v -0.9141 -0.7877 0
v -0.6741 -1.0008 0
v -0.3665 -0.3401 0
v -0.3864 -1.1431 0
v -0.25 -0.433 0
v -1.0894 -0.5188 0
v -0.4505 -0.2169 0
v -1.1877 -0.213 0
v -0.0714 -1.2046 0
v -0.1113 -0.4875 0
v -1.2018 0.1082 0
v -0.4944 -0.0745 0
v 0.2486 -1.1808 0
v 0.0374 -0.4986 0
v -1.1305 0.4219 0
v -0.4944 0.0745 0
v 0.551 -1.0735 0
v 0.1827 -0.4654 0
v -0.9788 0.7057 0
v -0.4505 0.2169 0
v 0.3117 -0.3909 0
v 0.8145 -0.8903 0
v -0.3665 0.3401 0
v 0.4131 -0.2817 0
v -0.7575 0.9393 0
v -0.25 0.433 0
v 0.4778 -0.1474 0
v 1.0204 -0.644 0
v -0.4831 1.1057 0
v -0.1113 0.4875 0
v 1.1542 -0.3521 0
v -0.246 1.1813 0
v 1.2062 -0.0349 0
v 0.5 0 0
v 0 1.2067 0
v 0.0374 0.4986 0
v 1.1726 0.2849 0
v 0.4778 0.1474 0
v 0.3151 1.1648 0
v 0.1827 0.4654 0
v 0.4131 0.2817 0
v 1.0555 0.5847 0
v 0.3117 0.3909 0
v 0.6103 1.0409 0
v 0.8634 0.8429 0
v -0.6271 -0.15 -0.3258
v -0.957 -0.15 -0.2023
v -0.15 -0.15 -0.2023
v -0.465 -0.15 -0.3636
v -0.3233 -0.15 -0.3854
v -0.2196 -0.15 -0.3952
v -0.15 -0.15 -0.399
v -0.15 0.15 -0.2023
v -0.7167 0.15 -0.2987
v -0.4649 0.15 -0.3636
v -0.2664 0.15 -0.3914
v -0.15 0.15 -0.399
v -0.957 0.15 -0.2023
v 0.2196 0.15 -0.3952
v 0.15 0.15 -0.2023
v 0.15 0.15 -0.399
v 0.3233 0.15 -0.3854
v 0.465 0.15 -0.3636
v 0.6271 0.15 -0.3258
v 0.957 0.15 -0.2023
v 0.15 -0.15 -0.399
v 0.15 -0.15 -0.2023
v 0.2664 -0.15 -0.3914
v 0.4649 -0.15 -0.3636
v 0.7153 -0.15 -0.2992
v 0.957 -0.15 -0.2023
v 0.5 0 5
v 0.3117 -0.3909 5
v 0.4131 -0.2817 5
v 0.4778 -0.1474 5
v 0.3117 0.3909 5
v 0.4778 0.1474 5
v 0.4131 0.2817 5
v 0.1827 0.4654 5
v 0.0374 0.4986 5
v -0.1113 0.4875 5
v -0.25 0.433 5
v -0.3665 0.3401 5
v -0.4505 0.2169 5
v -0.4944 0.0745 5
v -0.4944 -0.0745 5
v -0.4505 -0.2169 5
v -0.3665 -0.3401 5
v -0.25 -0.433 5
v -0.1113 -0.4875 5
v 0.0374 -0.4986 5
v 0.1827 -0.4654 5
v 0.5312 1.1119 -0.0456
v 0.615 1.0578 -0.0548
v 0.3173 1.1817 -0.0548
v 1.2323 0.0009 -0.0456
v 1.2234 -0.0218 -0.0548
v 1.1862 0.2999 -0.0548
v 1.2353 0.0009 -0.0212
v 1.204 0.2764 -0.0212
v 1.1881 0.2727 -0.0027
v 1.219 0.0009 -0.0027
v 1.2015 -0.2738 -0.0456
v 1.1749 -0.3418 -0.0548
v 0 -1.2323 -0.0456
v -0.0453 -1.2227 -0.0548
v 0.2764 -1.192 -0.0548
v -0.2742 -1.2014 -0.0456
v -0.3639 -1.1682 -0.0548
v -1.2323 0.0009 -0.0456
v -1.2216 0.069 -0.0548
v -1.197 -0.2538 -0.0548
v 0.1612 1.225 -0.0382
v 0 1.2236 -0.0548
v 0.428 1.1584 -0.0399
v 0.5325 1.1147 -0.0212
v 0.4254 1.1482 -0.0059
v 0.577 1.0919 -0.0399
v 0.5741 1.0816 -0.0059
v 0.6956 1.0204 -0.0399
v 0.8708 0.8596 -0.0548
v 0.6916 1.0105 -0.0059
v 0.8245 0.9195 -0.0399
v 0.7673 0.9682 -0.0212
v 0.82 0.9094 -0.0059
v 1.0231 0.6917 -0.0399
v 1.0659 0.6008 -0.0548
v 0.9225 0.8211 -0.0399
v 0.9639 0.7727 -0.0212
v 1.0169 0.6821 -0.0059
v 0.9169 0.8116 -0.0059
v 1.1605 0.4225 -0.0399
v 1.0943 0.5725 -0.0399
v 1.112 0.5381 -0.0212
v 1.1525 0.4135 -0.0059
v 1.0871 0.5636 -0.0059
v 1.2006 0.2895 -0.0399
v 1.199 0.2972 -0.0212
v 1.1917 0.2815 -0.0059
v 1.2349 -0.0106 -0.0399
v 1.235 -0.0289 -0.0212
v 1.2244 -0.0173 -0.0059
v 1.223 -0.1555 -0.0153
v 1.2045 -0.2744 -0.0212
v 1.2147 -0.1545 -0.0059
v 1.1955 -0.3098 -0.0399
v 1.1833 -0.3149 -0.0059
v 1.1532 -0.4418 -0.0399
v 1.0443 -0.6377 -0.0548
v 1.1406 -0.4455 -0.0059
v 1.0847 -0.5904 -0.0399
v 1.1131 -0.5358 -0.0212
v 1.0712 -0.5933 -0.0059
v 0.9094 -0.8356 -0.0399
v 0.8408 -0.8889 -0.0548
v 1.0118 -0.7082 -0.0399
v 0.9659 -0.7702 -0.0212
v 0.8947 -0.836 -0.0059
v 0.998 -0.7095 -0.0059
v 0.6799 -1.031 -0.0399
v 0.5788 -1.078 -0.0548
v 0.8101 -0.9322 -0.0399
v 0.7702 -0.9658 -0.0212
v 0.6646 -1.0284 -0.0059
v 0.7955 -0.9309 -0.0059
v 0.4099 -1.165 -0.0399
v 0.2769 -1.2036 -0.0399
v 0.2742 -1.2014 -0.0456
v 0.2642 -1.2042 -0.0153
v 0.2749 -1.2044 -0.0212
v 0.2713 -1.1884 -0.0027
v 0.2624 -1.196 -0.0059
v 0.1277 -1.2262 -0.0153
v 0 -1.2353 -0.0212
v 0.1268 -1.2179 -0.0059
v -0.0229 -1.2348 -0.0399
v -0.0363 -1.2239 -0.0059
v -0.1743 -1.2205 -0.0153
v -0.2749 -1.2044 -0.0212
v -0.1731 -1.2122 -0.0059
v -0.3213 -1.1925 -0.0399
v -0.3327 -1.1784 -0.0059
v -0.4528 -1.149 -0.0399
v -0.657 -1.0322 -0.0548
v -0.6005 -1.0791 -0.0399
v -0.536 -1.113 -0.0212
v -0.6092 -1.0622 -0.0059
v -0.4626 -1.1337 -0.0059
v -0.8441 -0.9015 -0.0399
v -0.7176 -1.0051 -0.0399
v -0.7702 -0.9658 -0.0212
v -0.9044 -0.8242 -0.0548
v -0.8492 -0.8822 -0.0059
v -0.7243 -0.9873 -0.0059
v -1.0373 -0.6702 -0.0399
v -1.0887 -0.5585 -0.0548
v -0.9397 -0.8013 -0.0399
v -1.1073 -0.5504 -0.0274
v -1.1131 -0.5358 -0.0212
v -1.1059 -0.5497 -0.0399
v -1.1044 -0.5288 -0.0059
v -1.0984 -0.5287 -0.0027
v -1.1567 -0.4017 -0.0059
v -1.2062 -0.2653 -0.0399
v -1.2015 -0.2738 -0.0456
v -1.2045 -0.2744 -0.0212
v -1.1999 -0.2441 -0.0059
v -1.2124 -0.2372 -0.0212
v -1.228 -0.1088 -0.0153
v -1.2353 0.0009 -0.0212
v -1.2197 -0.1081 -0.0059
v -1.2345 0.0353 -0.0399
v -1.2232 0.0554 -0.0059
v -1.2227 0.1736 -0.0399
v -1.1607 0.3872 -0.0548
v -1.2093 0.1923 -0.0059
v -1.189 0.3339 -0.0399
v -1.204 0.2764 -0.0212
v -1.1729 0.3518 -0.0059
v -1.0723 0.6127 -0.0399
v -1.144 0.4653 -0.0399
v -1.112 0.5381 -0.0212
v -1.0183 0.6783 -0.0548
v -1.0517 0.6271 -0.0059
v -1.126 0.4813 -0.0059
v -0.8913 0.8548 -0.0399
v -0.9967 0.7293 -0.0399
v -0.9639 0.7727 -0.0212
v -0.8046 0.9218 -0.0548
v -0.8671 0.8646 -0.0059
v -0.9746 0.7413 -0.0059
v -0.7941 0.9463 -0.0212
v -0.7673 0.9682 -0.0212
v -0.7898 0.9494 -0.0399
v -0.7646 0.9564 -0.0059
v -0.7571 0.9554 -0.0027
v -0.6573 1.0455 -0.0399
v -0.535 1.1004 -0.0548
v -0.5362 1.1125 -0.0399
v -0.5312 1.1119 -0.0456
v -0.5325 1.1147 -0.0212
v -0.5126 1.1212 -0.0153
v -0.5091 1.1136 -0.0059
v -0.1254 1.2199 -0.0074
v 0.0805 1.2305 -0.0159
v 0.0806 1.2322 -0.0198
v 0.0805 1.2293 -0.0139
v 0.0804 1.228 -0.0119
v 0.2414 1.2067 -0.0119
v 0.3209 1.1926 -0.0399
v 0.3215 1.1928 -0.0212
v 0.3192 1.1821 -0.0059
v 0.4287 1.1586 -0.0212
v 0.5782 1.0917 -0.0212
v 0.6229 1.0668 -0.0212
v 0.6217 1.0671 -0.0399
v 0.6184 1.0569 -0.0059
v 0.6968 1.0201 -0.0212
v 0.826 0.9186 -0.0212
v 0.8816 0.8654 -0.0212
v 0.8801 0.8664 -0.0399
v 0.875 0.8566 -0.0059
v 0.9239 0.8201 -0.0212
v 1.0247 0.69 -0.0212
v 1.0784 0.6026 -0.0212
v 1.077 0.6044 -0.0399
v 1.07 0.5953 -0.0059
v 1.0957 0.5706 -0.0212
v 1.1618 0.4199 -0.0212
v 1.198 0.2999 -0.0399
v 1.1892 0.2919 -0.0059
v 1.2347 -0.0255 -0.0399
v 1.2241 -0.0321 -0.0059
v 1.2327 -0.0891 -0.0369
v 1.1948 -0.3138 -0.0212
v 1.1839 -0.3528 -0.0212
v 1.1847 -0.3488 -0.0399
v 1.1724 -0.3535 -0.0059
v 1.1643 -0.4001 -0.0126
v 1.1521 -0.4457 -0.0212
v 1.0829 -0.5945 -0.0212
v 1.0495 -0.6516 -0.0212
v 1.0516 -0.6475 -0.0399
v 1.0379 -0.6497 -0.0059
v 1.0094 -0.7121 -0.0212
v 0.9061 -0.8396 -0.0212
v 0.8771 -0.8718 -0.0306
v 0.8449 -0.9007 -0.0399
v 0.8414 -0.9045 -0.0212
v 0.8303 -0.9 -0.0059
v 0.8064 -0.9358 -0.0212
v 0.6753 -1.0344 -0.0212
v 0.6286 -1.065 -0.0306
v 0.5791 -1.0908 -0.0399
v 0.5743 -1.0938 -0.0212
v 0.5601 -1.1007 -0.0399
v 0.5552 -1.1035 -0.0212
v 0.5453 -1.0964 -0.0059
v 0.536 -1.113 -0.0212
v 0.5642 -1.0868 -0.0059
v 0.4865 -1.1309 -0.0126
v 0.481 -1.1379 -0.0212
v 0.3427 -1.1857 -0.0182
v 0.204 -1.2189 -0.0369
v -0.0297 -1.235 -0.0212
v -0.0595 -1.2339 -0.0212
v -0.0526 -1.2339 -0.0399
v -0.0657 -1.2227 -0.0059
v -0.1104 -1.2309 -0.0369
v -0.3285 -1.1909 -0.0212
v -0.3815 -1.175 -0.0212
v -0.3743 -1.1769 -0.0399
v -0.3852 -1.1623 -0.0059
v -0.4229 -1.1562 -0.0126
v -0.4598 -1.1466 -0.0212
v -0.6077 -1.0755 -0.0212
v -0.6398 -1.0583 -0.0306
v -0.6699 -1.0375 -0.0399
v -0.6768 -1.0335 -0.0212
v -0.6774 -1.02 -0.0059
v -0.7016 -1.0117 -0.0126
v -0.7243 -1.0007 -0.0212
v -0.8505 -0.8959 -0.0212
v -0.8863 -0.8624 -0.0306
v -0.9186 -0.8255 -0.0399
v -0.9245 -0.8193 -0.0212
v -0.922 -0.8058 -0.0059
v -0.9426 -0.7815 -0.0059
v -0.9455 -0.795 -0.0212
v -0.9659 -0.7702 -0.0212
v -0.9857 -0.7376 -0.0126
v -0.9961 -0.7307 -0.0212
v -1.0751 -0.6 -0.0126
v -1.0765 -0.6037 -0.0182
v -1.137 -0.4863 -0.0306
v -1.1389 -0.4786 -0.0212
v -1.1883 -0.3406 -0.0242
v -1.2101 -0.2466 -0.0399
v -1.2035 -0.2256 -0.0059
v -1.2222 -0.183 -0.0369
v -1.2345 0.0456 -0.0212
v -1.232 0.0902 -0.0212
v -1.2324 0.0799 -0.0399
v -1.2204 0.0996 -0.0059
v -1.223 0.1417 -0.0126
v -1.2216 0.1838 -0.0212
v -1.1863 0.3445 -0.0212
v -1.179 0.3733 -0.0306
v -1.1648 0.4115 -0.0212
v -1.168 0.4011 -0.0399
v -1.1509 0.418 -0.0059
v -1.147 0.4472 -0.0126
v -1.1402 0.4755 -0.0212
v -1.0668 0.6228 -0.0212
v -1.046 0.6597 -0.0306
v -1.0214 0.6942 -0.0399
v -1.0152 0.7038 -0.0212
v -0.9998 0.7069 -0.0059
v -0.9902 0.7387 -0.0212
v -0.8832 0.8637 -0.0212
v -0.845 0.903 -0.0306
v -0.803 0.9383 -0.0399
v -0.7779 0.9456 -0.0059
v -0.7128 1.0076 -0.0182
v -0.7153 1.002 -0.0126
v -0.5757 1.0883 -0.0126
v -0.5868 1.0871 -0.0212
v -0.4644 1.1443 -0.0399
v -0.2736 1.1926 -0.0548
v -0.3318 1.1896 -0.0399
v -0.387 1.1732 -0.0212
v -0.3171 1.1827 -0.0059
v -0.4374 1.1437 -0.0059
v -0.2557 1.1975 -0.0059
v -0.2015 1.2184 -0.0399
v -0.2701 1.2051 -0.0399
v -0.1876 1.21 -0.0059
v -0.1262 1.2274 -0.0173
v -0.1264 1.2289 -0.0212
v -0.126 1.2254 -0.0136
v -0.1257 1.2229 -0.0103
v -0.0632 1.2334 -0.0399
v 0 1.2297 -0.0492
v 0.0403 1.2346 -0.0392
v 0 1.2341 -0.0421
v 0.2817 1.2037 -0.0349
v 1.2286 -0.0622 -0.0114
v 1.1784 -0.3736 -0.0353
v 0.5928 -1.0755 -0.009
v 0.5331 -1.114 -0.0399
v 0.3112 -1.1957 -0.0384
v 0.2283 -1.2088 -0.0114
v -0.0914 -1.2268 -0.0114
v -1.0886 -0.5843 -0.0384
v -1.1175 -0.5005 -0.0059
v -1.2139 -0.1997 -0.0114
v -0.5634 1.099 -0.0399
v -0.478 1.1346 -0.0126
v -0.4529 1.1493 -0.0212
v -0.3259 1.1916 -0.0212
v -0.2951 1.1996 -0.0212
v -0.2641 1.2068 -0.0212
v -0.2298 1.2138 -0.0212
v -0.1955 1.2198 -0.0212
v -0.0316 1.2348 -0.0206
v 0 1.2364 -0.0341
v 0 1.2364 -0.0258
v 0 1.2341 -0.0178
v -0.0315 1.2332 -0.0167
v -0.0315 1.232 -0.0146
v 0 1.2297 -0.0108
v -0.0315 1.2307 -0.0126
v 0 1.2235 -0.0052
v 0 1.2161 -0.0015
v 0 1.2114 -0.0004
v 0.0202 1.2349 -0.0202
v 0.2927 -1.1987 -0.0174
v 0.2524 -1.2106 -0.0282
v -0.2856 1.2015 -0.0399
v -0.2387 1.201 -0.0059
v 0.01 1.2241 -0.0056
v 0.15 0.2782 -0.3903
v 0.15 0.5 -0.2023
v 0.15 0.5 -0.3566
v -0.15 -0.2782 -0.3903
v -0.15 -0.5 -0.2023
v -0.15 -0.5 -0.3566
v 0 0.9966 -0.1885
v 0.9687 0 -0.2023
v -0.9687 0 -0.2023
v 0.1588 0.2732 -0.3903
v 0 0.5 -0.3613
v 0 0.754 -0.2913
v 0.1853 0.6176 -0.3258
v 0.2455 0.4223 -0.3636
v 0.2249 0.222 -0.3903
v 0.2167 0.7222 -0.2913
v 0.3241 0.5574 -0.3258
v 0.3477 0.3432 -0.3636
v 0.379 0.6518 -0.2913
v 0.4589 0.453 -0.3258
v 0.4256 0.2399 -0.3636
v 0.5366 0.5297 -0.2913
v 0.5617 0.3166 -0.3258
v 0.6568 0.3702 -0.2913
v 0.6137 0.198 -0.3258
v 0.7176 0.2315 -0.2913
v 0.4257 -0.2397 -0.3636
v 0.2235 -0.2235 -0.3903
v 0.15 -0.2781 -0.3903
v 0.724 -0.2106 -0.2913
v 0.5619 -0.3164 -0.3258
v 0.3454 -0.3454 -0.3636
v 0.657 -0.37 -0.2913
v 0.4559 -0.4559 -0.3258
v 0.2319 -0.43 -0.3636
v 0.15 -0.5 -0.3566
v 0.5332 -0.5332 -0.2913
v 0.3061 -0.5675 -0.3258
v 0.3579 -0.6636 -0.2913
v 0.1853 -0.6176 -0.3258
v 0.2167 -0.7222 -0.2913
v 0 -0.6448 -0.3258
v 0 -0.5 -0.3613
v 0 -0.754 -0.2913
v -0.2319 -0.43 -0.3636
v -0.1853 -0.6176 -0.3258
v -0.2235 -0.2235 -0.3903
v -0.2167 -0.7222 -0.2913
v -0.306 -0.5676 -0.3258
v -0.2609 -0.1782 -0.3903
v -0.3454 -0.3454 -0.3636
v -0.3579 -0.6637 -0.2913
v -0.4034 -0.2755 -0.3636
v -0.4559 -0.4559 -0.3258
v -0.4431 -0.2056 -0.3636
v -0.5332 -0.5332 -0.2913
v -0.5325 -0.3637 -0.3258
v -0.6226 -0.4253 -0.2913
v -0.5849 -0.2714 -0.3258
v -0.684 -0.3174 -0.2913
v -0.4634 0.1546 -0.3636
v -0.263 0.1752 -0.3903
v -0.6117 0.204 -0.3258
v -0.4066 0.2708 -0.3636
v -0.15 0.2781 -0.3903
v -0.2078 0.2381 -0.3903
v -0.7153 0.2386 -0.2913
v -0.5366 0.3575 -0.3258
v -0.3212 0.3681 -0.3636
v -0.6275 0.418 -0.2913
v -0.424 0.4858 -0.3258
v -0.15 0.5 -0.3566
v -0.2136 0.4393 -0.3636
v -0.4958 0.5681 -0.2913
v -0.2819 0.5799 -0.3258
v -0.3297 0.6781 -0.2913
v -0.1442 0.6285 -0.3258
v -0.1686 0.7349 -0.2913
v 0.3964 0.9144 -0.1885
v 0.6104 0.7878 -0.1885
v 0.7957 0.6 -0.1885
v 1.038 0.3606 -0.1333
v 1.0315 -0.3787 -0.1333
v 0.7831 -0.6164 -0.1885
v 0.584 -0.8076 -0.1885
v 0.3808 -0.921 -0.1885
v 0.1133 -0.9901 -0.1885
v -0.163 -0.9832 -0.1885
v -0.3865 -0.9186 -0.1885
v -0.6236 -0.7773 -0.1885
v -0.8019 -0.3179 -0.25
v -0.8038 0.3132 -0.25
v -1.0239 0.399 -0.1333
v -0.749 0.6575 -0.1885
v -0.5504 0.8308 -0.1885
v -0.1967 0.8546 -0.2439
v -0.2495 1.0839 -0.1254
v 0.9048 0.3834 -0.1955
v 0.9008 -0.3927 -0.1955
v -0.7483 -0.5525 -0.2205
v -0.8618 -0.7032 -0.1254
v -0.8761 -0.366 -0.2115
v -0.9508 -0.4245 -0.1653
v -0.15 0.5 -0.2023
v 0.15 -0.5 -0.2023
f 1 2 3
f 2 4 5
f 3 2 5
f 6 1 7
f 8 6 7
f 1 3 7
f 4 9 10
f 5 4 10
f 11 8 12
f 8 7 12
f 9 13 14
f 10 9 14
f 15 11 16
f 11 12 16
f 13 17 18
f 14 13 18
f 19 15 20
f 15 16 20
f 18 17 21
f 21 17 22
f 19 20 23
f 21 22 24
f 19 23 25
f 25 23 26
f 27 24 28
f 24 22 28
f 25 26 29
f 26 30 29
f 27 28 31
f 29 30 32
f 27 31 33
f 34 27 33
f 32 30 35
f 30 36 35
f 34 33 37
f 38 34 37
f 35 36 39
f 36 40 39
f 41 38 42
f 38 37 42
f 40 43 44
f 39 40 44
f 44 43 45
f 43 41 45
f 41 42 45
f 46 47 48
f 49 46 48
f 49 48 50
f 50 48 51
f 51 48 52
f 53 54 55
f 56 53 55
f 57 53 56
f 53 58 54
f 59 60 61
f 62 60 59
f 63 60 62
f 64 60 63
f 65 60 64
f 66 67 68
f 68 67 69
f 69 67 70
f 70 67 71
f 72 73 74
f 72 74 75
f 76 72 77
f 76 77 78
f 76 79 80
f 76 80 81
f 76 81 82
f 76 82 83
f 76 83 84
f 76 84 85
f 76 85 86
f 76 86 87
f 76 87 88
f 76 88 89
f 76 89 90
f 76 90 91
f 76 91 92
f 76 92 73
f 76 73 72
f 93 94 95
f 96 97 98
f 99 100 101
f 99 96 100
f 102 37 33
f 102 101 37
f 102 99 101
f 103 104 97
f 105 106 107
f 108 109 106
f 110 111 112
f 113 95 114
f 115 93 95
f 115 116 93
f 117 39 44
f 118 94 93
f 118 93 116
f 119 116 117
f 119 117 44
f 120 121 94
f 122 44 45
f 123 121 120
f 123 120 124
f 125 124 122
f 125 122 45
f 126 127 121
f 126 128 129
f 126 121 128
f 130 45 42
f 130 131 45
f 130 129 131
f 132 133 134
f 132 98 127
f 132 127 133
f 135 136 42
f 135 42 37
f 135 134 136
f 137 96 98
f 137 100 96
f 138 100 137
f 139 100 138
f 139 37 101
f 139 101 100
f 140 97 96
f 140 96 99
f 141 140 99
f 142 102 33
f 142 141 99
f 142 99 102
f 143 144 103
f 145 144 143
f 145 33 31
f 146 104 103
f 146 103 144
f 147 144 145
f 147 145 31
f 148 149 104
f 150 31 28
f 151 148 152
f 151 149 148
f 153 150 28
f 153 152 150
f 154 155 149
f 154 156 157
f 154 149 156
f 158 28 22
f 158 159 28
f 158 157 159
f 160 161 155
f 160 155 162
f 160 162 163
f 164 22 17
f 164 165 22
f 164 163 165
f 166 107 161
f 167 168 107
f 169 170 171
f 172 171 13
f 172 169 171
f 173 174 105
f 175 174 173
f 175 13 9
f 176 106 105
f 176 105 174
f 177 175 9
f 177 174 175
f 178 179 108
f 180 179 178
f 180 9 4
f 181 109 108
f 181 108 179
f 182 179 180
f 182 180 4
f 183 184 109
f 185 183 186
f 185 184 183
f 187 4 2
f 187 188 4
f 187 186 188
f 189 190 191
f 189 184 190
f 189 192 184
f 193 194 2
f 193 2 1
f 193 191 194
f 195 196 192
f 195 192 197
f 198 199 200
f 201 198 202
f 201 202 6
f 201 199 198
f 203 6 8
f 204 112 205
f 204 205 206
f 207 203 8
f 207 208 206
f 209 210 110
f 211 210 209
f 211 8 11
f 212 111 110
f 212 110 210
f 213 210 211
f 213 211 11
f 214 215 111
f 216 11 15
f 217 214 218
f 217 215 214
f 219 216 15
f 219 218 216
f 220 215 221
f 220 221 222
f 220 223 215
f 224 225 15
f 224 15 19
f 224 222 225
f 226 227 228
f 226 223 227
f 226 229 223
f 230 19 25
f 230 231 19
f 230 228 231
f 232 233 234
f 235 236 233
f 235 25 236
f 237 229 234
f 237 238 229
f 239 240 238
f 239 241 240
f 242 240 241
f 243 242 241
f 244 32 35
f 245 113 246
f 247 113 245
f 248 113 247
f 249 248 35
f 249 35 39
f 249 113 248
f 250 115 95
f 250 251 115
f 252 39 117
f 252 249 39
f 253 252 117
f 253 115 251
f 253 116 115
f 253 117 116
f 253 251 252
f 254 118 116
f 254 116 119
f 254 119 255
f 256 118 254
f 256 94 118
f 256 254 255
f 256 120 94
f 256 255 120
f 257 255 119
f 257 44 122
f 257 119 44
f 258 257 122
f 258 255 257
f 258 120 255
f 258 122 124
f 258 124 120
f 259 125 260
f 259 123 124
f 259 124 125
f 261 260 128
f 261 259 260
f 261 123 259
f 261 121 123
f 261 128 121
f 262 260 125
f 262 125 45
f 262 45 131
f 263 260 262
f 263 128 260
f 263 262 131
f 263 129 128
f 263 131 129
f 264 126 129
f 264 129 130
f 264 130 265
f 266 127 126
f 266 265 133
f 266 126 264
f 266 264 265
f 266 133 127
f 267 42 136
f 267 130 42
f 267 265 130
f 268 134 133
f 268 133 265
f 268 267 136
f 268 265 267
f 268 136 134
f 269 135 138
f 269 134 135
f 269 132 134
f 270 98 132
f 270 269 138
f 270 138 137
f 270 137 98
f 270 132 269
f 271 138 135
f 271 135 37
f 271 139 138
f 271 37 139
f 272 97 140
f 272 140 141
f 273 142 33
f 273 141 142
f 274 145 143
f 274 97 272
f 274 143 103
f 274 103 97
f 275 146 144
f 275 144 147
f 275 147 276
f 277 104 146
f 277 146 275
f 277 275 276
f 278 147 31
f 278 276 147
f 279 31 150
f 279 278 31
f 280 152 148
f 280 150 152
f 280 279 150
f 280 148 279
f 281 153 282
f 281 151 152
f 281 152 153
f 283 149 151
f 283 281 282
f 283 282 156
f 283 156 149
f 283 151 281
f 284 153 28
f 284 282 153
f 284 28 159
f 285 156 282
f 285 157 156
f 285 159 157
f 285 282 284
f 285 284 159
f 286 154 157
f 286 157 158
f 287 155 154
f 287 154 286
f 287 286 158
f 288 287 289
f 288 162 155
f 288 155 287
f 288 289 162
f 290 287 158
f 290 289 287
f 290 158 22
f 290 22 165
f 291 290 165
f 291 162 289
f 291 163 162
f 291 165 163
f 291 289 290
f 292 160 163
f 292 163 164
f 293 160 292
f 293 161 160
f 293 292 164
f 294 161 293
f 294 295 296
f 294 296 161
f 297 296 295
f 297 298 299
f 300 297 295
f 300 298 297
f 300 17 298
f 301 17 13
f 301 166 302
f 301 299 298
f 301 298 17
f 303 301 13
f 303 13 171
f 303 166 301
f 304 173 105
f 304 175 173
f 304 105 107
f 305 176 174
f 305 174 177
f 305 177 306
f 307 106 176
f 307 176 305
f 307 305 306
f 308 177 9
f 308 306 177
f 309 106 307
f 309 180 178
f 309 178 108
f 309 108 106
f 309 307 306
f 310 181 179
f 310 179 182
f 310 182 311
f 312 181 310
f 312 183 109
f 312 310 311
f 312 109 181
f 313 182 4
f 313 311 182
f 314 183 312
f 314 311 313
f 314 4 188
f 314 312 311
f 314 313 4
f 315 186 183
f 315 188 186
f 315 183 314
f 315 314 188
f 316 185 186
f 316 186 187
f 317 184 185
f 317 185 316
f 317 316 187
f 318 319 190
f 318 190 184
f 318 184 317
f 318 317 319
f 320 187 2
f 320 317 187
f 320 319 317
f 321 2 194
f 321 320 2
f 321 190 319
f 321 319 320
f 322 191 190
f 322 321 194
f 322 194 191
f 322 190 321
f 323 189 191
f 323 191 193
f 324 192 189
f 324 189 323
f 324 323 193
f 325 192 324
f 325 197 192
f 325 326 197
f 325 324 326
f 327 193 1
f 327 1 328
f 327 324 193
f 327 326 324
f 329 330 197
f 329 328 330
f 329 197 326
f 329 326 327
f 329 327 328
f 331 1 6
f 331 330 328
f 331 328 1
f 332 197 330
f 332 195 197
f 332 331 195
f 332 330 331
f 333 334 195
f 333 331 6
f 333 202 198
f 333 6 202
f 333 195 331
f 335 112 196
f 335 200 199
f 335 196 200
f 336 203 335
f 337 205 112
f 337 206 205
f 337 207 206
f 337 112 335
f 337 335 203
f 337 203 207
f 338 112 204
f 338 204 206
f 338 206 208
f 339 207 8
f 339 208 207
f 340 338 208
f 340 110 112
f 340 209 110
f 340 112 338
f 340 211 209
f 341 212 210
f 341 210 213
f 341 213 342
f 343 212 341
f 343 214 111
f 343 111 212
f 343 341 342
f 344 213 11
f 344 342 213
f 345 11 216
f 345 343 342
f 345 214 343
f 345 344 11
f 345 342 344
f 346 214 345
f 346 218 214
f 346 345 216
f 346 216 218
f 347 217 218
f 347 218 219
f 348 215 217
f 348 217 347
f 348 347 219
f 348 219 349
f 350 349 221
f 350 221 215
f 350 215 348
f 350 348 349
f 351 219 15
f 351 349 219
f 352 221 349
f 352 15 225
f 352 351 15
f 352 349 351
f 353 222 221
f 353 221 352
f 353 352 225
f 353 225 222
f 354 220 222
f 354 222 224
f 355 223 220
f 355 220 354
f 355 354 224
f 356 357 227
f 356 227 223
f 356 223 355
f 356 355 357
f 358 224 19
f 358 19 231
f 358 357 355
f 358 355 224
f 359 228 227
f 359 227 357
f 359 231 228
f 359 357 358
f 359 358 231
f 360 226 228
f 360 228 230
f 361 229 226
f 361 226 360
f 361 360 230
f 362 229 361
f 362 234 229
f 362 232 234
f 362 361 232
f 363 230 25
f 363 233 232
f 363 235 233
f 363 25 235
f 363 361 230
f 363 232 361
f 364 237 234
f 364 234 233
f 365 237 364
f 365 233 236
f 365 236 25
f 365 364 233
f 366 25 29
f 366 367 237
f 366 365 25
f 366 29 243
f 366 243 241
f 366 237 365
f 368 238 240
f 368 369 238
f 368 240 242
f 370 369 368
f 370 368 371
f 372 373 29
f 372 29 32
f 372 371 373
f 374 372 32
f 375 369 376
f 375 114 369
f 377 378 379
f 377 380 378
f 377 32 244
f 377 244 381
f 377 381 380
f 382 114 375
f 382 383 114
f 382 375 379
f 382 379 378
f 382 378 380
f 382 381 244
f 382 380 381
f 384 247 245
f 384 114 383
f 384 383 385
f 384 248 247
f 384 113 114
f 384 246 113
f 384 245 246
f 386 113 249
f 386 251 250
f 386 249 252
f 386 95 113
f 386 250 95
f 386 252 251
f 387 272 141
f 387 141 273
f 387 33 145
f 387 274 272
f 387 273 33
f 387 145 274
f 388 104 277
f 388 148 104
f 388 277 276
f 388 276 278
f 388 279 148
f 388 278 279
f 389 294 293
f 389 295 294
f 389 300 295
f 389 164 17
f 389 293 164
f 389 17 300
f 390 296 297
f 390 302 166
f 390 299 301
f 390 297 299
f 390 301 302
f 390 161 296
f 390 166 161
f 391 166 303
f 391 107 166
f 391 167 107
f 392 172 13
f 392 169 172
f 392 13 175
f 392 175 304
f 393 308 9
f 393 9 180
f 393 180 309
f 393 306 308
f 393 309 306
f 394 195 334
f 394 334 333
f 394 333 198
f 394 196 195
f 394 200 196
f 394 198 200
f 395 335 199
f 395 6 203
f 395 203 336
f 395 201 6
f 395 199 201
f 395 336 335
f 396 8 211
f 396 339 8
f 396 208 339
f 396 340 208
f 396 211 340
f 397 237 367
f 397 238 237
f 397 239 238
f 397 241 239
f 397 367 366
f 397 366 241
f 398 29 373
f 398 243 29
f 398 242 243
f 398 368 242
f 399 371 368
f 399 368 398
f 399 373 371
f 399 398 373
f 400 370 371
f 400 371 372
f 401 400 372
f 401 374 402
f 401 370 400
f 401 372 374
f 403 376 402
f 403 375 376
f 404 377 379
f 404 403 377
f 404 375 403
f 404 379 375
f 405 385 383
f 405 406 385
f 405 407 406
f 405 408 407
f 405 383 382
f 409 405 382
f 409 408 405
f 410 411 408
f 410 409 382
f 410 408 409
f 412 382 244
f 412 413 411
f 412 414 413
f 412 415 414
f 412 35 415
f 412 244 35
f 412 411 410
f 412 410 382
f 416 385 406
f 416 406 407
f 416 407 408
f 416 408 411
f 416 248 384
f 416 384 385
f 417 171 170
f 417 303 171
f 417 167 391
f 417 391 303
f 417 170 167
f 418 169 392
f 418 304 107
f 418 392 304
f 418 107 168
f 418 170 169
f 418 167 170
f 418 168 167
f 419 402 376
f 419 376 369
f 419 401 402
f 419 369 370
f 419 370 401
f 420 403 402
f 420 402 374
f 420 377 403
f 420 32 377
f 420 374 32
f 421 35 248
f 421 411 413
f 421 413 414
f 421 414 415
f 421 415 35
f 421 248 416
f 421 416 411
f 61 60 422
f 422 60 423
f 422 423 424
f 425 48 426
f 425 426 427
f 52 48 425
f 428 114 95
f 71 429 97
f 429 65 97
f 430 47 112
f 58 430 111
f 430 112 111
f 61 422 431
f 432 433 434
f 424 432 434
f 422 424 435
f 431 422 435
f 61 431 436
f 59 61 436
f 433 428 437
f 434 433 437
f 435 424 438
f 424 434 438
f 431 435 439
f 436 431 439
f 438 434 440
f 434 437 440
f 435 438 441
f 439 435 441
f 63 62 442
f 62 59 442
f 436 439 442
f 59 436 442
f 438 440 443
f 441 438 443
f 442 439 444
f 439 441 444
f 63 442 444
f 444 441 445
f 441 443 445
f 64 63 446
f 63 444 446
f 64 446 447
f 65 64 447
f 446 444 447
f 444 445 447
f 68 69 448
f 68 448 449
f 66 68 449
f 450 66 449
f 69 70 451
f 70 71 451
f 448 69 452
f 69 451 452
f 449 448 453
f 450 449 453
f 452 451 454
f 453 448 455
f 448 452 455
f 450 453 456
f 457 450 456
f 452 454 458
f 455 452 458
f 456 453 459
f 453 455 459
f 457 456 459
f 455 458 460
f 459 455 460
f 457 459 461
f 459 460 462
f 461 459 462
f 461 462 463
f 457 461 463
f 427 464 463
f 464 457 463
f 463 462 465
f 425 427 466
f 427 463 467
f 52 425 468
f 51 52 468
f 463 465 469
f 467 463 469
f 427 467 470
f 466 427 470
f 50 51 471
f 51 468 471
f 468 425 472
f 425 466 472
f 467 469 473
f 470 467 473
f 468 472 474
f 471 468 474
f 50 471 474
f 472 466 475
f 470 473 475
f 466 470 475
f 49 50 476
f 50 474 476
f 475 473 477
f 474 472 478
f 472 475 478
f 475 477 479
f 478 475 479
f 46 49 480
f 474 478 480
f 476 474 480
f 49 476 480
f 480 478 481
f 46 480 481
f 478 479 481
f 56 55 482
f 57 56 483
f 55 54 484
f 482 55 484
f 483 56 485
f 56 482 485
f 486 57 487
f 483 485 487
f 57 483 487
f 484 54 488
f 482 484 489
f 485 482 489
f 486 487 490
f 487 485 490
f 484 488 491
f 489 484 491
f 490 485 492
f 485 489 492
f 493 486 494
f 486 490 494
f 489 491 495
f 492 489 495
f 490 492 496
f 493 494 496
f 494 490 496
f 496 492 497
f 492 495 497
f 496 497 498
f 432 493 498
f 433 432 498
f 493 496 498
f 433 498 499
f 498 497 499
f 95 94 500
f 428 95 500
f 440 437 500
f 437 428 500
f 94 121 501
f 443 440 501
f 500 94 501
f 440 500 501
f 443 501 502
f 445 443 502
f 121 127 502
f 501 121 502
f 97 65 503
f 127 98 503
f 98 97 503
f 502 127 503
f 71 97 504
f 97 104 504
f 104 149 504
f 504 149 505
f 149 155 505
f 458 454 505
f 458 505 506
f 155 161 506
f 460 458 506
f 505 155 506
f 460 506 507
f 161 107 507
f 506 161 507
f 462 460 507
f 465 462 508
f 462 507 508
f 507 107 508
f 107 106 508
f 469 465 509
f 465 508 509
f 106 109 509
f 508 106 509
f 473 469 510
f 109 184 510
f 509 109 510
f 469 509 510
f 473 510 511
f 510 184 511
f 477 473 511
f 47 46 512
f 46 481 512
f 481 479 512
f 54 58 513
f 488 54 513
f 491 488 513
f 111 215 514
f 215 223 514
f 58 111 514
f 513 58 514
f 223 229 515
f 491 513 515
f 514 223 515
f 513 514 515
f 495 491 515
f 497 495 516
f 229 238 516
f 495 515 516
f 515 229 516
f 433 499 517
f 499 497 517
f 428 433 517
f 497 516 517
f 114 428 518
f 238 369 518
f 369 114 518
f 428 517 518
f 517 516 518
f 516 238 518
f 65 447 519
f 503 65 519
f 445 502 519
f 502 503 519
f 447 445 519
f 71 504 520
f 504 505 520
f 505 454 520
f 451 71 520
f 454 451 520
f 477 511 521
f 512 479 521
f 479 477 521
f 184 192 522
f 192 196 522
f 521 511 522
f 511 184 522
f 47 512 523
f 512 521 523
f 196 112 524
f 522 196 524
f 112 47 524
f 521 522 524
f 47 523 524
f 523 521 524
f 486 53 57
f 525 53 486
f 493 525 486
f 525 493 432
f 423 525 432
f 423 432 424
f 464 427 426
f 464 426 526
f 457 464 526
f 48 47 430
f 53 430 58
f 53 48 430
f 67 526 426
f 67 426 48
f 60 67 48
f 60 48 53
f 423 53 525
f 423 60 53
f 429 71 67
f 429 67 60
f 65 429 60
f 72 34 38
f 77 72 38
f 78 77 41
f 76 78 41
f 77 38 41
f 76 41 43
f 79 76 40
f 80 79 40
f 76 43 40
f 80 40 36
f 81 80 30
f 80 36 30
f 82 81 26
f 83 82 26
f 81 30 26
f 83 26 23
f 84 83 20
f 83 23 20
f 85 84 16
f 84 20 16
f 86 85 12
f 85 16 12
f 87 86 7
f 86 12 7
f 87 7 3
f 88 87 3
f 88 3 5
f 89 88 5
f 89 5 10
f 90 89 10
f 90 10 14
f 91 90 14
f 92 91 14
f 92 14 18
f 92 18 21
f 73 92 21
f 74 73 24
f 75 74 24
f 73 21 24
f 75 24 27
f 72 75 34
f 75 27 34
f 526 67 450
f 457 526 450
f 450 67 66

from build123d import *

# Parameters (mm, degrees)
SKETCH1_R               = 0.5
BOSS_EXTRUDE1_DEPTH     = 5
FILLET1_R               = 0.03
SKETCH3_W               = 0.2
SKETCH3_H               = 0.3
CUT_EXTRUDE1_DEPTH      = 2.236671107
CUT_EXTRUDE1_DEPTH_BACK = 2.236671107
SKETCH4_W               = 0.3
SKETCH4_H               = 0.199294318
CUT_EXTRUDE2_DEPTH      = 0.5


with BuildPart() as part:
    # Sketch1 → Boss-Extrude1 (new body)
    with BuildSketch(Plane.XY):
        Circle(SKETCH1_R)
    extrude(amount=BOSS_EXTRUDE1_DEPTH)

    # Sketch2 → Revolve1 (revolve)
    with BuildSketch(Plane(origin=(0, 0, 0), x_dir=(0, 0, -1), z_dir=(1, 0, 0))):
        with BuildLine():
            Line((0, 0), (0.4, 0))
            ThreePointArc((0.4, 0), (0.313905644, 0.685047891), (0, 1.3))
            Line((0, 1.3), (0, 0))
        make_face()
    revolve(axis=Axis((0, 0, 0), (0, 0, -1)))

    # Fillet1
    fillet1_edges = [part.edges().sort_by_distance(p)[0] for p in [
        (0, -1.3, 0),
    ]]
    fillet(fillet1_edges, radius=FILLET1_R)

    # Sketch3 → Cut-Extrude1 (cut, two sides)
    with BuildSketch(Plane(origin=(0, 0, 0), x_dir=(0, 0, -1), z_dir=(1, 0, 0))) as cut_extrude1_sk:
        with Locations((0.302347627, 0)):
            Rectangle(SKETCH3_W, SKETCH3_H)
    extrude(amount=CUT_EXTRUDE1_DEPTH, mode=Mode.SUBTRACT)
    extrude(cut_extrude1_sk.sketch, amount=-CUT_EXTRUDE1_DEPTH_BACK, mode=Mode.SUBTRACT)

    # Sketch4 → Cut-Extrude2 (cut, symmetric)
    with BuildSketch(Plane(origin=(0, 0, 0), x_dir=(1, 0, 0), z_dir=(0, 1, 0))):
        with Locations((0, 0.301994786)):
            Rectangle(SKETCH4_W, SKETCH4_H)
    extrude(amount=CUT_EXTRUDE2_DEPTH, both=True, mode=Mode.SUBTRACT)


solid = part.part
